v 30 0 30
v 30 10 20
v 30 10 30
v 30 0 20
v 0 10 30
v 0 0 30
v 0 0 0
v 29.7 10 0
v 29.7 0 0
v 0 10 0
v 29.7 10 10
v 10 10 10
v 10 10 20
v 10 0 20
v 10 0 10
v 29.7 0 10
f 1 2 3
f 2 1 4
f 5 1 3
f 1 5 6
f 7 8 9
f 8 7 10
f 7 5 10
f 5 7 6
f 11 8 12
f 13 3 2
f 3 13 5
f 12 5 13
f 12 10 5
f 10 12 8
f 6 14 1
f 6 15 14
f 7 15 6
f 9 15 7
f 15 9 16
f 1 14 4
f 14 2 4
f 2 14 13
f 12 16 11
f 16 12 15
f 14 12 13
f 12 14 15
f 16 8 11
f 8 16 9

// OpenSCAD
overbite = 0.3;

difference() {
	cube([30, 10, 30]);
	translate([10, 0, 10]) {
		cube([20, 10, 10]);
	}
	translate([30 - overbite, 0, 0]) {
		cube([overbite, 10, 10]);
	}
}
